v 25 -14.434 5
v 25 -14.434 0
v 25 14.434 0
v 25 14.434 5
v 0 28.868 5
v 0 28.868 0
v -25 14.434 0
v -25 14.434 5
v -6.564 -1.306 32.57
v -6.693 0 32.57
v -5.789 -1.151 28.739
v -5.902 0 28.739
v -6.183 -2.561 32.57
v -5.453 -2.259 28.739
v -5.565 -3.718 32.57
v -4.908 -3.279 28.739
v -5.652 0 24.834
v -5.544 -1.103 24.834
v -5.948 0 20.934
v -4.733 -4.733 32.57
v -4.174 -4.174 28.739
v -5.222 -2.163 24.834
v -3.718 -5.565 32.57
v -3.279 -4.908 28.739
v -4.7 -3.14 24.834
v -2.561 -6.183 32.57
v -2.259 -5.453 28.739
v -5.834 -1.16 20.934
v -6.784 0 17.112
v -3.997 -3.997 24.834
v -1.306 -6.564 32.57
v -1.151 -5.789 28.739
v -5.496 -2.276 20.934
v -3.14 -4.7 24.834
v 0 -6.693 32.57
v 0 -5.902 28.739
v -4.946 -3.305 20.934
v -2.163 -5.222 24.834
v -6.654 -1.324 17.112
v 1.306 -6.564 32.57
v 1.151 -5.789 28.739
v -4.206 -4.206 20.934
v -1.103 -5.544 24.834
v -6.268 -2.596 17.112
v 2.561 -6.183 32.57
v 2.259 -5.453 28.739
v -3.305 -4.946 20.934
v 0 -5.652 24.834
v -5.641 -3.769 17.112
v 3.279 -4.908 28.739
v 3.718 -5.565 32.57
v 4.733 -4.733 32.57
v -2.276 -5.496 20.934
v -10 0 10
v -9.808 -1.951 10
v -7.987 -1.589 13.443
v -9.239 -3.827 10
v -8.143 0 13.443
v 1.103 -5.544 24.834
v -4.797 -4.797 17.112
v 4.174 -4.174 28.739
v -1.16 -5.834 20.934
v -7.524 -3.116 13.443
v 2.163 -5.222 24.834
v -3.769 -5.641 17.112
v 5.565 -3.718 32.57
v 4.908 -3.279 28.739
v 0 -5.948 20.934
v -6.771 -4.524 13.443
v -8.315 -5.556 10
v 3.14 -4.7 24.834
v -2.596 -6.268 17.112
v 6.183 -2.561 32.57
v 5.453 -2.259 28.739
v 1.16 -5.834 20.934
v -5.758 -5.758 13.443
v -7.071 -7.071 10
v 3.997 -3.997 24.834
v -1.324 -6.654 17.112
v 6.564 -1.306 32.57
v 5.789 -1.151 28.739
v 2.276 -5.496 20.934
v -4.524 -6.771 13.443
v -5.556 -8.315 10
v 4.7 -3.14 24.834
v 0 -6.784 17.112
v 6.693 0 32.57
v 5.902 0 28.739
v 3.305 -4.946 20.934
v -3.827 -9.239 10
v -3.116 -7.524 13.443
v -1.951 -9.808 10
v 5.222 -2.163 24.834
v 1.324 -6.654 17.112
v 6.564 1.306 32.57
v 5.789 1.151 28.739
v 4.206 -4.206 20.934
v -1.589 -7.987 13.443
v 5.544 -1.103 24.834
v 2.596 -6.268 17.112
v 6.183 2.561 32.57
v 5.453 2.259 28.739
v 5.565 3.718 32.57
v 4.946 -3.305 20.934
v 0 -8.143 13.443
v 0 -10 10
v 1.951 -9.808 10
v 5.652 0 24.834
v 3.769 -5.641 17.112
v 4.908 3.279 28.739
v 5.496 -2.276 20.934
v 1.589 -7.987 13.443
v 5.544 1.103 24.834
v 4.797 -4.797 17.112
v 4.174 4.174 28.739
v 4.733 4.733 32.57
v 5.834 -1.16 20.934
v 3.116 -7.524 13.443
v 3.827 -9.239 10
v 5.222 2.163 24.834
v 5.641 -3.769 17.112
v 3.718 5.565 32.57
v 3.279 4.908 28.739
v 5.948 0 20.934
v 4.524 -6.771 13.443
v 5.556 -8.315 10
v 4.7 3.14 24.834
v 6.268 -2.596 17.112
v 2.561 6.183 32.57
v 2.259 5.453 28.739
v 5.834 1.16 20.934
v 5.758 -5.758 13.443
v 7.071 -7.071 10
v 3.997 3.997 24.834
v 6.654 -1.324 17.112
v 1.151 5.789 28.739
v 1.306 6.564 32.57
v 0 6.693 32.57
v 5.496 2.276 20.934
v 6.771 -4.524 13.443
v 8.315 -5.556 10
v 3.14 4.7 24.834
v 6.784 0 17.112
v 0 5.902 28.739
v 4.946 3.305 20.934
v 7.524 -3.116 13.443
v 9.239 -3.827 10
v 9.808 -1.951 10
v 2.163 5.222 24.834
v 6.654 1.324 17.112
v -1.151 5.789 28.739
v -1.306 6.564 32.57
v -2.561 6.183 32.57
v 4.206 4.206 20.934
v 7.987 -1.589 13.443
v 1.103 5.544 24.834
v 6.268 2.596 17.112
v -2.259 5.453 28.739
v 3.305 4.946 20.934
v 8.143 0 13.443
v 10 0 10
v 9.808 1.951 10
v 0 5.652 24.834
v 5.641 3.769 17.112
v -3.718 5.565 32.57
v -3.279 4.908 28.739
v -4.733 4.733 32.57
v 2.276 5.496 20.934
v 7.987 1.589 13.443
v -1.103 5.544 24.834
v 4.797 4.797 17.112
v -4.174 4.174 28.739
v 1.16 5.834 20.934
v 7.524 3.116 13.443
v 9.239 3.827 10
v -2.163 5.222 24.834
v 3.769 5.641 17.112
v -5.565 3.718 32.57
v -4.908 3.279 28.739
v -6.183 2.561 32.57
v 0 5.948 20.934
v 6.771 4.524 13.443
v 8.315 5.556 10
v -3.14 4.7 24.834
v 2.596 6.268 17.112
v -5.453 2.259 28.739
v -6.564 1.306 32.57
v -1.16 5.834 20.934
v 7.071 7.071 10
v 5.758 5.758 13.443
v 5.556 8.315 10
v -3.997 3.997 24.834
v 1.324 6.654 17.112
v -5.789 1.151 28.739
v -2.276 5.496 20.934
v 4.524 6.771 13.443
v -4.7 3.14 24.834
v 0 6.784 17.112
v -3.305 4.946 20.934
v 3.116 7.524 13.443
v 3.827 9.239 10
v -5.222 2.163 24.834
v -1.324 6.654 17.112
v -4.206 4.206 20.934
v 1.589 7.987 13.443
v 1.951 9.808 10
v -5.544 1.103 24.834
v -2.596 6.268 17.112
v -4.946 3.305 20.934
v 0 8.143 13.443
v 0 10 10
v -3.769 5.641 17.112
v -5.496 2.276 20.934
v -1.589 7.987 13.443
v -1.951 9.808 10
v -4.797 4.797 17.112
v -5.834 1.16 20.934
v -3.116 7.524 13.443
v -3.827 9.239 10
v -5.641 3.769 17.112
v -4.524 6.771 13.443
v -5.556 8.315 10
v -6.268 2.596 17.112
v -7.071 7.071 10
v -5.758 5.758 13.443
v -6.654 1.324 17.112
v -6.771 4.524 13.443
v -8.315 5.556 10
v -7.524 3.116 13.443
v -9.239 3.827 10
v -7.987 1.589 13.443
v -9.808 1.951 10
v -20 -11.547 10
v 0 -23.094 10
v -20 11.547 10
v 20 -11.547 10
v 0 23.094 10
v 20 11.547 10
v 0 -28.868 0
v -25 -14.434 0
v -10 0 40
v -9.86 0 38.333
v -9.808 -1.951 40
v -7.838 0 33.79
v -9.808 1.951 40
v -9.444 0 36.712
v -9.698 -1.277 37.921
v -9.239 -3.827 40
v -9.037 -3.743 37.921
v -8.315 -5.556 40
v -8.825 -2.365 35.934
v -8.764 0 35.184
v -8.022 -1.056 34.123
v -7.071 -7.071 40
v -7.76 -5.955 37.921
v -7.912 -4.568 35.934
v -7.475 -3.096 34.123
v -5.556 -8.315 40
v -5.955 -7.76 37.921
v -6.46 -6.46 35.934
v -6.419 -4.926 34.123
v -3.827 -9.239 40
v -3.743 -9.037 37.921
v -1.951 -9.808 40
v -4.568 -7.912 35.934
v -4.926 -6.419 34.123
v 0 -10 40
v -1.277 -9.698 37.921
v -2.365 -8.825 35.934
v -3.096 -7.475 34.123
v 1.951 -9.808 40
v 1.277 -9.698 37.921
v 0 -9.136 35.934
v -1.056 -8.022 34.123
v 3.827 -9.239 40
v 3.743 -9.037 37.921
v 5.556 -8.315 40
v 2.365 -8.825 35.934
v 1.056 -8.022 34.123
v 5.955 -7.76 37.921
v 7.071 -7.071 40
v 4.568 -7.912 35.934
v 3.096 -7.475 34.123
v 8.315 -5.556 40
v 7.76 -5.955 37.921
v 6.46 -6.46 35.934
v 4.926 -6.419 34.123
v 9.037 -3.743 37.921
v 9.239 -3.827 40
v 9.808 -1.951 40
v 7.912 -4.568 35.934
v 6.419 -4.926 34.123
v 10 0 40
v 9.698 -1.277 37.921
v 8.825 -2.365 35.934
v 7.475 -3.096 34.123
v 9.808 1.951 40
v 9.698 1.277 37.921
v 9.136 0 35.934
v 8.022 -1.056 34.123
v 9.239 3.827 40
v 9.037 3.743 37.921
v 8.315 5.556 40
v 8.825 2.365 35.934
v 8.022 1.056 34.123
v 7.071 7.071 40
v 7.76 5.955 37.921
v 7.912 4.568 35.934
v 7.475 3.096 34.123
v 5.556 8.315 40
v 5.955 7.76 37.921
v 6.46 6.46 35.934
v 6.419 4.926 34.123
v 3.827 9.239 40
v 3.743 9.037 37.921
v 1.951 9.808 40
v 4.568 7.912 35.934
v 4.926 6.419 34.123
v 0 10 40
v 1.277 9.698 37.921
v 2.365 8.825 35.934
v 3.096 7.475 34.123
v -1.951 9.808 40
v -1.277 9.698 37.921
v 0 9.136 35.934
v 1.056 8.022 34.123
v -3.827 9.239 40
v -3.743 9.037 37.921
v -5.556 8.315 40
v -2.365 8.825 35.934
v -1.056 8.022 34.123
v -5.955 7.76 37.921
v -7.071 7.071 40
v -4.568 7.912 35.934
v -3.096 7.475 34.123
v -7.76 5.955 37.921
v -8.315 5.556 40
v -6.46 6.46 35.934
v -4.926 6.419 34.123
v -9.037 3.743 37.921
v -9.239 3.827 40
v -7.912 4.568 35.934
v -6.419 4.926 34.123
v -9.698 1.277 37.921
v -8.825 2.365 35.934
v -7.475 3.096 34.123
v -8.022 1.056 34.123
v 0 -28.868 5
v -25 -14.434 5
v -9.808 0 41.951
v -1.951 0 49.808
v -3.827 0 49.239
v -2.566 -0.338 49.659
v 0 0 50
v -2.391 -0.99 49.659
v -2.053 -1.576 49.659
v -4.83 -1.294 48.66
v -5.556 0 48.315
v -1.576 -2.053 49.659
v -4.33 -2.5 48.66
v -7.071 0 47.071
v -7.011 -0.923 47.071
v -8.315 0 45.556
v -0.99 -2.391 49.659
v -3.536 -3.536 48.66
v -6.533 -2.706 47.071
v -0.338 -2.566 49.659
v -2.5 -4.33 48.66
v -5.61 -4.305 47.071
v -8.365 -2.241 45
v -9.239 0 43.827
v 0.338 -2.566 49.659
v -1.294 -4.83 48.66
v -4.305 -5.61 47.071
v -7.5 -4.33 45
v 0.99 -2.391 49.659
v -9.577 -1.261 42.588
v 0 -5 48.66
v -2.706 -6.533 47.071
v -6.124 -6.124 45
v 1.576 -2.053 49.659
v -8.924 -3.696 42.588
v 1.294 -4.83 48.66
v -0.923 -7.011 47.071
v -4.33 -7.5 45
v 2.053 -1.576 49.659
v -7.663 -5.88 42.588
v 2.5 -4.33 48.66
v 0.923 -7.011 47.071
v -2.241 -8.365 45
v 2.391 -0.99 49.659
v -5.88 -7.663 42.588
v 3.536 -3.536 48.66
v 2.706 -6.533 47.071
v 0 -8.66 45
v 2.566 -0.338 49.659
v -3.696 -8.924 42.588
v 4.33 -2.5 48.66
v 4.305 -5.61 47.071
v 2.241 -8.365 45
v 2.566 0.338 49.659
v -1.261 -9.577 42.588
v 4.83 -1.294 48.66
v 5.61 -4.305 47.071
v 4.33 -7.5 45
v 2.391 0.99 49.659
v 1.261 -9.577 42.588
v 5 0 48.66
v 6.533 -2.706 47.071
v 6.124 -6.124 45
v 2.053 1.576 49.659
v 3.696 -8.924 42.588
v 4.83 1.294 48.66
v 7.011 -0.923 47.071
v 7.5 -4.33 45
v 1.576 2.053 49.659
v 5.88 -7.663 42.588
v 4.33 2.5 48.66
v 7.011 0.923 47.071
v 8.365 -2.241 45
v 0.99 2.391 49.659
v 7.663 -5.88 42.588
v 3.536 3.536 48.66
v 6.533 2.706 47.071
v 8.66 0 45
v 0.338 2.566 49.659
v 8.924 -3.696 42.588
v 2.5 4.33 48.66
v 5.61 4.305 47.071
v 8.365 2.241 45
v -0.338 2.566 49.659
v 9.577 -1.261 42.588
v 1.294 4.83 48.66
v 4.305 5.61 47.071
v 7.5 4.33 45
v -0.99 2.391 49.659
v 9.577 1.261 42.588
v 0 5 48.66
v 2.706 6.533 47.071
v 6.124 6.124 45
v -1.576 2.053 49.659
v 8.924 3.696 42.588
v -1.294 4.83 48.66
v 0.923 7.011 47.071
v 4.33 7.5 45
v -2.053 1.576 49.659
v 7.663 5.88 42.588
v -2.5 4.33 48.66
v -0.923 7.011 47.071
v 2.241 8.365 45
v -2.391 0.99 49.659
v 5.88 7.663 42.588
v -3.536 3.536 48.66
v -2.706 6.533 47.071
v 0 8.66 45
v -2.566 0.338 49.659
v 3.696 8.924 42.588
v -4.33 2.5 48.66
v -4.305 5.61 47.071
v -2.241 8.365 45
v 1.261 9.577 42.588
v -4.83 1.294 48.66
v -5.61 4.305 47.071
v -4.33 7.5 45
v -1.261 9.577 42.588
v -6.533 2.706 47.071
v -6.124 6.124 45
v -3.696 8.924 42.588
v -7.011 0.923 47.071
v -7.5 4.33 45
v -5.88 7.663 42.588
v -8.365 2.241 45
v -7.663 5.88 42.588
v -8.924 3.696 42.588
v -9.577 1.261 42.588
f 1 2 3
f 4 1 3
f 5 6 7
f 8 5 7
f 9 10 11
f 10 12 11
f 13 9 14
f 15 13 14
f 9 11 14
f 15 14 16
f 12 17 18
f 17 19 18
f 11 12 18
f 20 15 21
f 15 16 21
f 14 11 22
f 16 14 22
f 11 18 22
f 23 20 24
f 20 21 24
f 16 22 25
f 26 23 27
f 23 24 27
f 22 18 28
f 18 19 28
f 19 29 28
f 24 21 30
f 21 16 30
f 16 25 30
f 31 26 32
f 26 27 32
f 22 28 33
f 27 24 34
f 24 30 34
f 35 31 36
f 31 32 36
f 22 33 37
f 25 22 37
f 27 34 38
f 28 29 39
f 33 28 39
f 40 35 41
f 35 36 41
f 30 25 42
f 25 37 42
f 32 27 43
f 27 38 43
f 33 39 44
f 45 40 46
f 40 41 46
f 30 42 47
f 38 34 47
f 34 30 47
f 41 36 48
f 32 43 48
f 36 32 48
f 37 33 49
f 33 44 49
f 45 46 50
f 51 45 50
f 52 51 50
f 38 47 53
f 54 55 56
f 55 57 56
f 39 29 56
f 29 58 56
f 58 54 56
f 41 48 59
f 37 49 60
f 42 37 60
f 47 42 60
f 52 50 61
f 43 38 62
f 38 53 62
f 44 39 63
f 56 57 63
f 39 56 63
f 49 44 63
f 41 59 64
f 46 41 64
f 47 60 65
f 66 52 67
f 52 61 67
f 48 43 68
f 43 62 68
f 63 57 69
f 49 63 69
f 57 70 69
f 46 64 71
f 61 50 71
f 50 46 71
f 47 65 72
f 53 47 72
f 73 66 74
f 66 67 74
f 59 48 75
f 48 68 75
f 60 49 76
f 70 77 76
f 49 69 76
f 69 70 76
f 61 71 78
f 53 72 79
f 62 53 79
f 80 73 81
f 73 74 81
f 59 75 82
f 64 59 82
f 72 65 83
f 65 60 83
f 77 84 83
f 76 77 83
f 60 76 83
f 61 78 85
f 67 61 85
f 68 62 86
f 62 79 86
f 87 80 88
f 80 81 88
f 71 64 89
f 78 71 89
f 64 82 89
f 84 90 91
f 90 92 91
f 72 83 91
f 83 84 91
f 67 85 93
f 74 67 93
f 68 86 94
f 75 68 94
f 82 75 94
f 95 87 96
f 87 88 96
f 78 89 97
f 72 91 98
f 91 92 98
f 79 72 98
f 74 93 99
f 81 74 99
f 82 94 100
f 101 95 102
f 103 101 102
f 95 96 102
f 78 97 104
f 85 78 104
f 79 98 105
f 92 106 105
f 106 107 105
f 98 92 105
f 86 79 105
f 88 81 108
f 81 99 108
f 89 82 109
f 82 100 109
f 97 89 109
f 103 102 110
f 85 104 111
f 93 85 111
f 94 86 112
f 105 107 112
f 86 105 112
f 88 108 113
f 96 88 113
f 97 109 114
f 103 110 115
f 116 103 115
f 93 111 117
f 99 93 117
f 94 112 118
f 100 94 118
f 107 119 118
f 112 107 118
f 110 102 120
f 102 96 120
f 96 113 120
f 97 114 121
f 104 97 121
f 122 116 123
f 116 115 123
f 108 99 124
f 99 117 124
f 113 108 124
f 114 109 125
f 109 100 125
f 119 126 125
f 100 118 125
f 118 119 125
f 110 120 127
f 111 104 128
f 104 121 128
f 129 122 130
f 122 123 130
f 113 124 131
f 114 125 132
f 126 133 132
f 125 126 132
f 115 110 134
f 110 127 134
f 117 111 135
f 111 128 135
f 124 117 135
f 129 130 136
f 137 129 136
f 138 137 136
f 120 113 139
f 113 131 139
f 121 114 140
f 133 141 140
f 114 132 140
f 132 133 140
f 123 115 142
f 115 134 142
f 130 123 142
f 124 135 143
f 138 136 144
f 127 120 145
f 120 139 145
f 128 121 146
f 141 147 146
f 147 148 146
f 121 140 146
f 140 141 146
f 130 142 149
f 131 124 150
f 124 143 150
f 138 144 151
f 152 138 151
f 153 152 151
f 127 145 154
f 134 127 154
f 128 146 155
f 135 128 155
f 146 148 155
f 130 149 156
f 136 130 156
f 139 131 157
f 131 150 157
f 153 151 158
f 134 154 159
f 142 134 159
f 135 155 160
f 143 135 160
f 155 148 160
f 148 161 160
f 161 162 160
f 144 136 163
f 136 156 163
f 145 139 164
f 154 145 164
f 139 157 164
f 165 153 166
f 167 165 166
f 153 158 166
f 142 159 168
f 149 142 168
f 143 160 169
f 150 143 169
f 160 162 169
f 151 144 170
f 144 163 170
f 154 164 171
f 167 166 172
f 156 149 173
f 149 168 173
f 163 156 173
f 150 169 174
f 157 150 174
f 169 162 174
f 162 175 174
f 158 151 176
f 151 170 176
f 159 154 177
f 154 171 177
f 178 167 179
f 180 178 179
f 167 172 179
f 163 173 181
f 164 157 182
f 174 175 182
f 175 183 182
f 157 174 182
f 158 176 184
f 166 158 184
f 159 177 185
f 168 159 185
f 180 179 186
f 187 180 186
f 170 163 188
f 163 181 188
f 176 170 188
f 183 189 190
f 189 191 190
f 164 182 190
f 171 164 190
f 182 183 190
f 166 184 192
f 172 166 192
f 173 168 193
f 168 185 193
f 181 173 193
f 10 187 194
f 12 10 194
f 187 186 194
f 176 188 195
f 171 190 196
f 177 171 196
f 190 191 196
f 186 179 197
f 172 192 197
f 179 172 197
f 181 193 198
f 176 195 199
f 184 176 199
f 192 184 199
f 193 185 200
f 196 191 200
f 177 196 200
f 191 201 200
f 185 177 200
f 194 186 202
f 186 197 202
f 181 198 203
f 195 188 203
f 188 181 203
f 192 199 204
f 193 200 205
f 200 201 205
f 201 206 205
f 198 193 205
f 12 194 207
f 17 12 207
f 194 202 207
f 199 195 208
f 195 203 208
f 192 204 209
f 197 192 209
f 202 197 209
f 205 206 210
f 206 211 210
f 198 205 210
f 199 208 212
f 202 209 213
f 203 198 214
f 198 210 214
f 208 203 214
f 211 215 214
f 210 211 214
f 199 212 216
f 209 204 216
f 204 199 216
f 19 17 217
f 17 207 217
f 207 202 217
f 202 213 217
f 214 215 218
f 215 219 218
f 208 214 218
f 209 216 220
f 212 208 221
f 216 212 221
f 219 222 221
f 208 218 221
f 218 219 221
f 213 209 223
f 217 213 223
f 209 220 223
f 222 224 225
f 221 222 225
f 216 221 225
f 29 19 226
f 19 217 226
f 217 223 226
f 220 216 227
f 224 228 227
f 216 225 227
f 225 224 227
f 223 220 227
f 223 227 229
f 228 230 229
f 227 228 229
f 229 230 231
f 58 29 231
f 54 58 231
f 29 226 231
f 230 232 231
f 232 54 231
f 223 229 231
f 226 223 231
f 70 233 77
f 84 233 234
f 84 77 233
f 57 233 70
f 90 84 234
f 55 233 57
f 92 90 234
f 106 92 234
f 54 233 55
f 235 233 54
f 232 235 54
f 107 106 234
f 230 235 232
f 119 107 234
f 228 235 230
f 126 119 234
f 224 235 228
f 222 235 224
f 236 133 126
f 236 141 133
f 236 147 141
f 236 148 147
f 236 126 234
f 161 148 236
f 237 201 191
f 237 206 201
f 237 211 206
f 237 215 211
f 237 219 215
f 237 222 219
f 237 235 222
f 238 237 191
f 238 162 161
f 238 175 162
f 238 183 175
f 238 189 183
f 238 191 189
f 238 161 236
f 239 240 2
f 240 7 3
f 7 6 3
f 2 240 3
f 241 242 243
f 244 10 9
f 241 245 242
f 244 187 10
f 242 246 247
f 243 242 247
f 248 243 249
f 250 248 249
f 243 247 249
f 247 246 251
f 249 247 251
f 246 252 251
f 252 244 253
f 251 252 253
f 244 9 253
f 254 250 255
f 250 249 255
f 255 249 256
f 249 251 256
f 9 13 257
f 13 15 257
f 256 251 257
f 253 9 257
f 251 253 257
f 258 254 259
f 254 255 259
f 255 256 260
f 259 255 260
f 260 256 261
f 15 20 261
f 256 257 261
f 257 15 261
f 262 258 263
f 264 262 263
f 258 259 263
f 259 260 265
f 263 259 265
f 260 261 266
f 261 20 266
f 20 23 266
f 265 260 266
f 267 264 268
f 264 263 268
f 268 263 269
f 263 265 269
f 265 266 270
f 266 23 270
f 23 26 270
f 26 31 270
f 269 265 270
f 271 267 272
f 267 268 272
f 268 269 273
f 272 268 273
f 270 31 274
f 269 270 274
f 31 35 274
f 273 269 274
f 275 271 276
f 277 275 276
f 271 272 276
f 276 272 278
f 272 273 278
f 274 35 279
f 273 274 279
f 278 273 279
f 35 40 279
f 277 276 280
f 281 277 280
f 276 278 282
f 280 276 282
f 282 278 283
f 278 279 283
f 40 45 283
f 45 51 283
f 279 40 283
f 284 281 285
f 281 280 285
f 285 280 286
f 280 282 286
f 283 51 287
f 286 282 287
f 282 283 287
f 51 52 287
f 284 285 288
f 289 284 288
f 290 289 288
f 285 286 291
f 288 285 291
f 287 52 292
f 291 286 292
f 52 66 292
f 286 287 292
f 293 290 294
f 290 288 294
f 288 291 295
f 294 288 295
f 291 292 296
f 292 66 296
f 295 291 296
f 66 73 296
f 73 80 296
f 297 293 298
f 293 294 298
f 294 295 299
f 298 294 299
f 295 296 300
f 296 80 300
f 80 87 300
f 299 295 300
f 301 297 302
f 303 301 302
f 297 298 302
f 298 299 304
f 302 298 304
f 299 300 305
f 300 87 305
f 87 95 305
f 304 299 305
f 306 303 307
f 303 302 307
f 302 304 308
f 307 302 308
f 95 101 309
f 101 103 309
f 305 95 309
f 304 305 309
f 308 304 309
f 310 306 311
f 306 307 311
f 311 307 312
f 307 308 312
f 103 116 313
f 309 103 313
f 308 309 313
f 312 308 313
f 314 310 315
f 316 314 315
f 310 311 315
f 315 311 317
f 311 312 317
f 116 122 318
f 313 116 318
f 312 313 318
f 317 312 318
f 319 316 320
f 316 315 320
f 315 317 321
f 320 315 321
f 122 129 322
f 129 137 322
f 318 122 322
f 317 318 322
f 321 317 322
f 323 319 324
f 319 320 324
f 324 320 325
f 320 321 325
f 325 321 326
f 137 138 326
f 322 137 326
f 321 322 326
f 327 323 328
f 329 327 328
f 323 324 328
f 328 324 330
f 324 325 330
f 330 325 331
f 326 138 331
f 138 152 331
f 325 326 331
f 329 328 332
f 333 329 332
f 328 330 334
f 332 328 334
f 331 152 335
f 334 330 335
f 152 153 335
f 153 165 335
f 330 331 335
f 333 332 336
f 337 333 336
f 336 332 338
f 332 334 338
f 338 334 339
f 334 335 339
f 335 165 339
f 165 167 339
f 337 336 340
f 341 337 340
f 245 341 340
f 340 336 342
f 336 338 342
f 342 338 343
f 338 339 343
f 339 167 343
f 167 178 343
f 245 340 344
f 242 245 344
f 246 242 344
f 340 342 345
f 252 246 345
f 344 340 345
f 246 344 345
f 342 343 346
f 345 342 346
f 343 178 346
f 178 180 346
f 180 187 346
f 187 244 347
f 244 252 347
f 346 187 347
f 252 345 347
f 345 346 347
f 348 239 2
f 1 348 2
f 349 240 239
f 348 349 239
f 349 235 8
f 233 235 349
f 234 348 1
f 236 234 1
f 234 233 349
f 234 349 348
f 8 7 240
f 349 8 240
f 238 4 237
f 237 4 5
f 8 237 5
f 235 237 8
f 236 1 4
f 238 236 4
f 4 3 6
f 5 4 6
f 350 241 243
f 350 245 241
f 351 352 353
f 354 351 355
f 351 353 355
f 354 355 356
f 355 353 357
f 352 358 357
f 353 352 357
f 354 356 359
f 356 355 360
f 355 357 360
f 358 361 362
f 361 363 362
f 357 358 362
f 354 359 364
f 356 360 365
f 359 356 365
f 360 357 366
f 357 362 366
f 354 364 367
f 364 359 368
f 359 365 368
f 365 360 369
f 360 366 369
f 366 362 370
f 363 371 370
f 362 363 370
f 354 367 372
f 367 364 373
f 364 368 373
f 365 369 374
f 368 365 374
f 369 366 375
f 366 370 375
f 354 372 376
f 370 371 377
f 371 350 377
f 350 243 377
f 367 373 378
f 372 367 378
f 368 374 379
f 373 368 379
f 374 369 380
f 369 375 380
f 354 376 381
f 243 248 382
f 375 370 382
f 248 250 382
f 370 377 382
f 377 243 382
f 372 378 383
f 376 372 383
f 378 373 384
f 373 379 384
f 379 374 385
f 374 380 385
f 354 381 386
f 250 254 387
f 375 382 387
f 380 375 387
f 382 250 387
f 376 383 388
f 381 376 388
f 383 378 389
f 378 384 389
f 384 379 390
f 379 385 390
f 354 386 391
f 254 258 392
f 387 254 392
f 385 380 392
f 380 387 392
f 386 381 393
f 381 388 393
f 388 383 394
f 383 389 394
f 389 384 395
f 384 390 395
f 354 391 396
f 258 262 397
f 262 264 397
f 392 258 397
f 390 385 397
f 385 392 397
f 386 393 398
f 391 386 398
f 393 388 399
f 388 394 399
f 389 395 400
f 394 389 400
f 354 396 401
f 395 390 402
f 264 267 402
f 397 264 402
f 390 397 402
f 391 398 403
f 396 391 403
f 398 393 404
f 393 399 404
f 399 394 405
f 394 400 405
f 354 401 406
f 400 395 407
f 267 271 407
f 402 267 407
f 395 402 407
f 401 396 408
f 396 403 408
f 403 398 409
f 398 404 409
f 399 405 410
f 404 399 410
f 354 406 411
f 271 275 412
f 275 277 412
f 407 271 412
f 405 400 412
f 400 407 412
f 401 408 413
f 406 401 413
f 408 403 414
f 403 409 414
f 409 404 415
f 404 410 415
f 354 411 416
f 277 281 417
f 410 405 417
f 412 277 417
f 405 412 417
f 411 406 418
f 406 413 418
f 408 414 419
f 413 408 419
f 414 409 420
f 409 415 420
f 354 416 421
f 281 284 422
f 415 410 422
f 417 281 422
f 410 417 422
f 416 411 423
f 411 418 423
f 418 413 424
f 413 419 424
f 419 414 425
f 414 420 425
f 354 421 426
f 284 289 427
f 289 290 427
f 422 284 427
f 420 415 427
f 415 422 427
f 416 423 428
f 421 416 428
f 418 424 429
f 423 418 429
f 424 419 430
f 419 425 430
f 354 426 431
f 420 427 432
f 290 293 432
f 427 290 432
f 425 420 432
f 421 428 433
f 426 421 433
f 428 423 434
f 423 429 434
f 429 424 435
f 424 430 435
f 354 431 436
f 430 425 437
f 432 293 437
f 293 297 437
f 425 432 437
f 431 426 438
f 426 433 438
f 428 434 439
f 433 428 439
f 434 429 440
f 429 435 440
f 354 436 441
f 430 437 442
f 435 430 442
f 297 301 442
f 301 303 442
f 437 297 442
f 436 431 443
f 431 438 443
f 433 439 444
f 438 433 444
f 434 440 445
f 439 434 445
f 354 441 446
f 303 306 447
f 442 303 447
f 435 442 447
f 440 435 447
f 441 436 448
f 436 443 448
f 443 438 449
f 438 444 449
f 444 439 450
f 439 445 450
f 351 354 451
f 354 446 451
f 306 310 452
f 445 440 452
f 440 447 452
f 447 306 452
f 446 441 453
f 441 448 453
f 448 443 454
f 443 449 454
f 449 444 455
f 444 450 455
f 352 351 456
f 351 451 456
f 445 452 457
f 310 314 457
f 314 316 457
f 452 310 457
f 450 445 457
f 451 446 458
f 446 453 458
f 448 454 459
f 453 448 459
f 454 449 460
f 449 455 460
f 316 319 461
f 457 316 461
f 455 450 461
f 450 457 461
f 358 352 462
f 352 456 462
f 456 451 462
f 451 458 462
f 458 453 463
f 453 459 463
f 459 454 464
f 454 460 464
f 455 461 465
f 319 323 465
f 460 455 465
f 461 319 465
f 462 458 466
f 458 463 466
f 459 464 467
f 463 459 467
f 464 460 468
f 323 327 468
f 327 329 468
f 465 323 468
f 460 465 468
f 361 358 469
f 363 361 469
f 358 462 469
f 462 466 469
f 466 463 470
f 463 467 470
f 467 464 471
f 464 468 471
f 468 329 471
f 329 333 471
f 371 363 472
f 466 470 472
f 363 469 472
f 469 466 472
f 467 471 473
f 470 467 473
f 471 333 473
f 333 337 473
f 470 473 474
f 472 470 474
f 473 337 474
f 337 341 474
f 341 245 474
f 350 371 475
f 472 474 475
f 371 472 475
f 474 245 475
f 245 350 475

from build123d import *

# Parameters (mm, degrees)
F1_DEPTH = 10
F4_SIZE  = 5


with BuildPart() as f1:
    # F0 (on Top) → F1 (new body)
    with BuildSketch(Plane.XY):
        Polygon((-25, 14.4337567297), (-25, -14.4337567297), (0, -28.8675134595), (25, -14.4337567297), (25, 14.4337567297), (0, 28.8675134595), align=None)
    extrude(amount=F1_DEPTH)

    # F2 (on Front) → F3 (revolve)
    with BuildSketch(Plane.XZ):
        with BuildLine():
            Line((0, 10), (0, 30))
            ThreePointArc((0, 30), (-3.5846514013, 30.6645688728), (-6.6928532543, 32.5699451337))
            ThreePointArc((-6.6928532543, 32.5699451337), (-5.9483456169, 20.9335846587), (-10, 10))
            Line((-10, 10), (0, 10))
        make_face()
        with BuildLine():
            Line((0, 30), (0, 50))
            ThreePointArc((0, 50), (-7.0710678119, 47.0710678119), (-10, 40))
            ThreePointArc((-10, 40), (-8.0756928824, 36.4054772252), (-6.6928532543, 32.5699451337))
            ThreePointArc((-6.6928532543, 32.5699451337), (-3.5846514013, 30.6645688728), (0, 30))
        make_face()
        with BuildLine():
            ThreePointArc((-6.6928532543, 32.5699451337), (-8.0756928824, 36.4054772252), (-10, 40))
            ThreePointArc((-10, 40), (-9.1358779694, 35.9335846587), (-6.6928532543, 32.5699451337))
        make_face()
    revolve(axis=Axis((0, 0, 30), (0, 0, 1)))

    # F4
    f4_edges = [f1.edges().sort_by_distance(p)[0] for p in [
        (-25, 0, 10),
        (-12.5, -21.650635, 10),
        (-12.5, 21.650635, 10),
        (12.5, 21.650635, 10),
        (25, 0, 10),
        (12.5, -21.650635, 10),
    ]]
    chamfer(f4_edges, length=F4_SIZE)


solid = f1.part
